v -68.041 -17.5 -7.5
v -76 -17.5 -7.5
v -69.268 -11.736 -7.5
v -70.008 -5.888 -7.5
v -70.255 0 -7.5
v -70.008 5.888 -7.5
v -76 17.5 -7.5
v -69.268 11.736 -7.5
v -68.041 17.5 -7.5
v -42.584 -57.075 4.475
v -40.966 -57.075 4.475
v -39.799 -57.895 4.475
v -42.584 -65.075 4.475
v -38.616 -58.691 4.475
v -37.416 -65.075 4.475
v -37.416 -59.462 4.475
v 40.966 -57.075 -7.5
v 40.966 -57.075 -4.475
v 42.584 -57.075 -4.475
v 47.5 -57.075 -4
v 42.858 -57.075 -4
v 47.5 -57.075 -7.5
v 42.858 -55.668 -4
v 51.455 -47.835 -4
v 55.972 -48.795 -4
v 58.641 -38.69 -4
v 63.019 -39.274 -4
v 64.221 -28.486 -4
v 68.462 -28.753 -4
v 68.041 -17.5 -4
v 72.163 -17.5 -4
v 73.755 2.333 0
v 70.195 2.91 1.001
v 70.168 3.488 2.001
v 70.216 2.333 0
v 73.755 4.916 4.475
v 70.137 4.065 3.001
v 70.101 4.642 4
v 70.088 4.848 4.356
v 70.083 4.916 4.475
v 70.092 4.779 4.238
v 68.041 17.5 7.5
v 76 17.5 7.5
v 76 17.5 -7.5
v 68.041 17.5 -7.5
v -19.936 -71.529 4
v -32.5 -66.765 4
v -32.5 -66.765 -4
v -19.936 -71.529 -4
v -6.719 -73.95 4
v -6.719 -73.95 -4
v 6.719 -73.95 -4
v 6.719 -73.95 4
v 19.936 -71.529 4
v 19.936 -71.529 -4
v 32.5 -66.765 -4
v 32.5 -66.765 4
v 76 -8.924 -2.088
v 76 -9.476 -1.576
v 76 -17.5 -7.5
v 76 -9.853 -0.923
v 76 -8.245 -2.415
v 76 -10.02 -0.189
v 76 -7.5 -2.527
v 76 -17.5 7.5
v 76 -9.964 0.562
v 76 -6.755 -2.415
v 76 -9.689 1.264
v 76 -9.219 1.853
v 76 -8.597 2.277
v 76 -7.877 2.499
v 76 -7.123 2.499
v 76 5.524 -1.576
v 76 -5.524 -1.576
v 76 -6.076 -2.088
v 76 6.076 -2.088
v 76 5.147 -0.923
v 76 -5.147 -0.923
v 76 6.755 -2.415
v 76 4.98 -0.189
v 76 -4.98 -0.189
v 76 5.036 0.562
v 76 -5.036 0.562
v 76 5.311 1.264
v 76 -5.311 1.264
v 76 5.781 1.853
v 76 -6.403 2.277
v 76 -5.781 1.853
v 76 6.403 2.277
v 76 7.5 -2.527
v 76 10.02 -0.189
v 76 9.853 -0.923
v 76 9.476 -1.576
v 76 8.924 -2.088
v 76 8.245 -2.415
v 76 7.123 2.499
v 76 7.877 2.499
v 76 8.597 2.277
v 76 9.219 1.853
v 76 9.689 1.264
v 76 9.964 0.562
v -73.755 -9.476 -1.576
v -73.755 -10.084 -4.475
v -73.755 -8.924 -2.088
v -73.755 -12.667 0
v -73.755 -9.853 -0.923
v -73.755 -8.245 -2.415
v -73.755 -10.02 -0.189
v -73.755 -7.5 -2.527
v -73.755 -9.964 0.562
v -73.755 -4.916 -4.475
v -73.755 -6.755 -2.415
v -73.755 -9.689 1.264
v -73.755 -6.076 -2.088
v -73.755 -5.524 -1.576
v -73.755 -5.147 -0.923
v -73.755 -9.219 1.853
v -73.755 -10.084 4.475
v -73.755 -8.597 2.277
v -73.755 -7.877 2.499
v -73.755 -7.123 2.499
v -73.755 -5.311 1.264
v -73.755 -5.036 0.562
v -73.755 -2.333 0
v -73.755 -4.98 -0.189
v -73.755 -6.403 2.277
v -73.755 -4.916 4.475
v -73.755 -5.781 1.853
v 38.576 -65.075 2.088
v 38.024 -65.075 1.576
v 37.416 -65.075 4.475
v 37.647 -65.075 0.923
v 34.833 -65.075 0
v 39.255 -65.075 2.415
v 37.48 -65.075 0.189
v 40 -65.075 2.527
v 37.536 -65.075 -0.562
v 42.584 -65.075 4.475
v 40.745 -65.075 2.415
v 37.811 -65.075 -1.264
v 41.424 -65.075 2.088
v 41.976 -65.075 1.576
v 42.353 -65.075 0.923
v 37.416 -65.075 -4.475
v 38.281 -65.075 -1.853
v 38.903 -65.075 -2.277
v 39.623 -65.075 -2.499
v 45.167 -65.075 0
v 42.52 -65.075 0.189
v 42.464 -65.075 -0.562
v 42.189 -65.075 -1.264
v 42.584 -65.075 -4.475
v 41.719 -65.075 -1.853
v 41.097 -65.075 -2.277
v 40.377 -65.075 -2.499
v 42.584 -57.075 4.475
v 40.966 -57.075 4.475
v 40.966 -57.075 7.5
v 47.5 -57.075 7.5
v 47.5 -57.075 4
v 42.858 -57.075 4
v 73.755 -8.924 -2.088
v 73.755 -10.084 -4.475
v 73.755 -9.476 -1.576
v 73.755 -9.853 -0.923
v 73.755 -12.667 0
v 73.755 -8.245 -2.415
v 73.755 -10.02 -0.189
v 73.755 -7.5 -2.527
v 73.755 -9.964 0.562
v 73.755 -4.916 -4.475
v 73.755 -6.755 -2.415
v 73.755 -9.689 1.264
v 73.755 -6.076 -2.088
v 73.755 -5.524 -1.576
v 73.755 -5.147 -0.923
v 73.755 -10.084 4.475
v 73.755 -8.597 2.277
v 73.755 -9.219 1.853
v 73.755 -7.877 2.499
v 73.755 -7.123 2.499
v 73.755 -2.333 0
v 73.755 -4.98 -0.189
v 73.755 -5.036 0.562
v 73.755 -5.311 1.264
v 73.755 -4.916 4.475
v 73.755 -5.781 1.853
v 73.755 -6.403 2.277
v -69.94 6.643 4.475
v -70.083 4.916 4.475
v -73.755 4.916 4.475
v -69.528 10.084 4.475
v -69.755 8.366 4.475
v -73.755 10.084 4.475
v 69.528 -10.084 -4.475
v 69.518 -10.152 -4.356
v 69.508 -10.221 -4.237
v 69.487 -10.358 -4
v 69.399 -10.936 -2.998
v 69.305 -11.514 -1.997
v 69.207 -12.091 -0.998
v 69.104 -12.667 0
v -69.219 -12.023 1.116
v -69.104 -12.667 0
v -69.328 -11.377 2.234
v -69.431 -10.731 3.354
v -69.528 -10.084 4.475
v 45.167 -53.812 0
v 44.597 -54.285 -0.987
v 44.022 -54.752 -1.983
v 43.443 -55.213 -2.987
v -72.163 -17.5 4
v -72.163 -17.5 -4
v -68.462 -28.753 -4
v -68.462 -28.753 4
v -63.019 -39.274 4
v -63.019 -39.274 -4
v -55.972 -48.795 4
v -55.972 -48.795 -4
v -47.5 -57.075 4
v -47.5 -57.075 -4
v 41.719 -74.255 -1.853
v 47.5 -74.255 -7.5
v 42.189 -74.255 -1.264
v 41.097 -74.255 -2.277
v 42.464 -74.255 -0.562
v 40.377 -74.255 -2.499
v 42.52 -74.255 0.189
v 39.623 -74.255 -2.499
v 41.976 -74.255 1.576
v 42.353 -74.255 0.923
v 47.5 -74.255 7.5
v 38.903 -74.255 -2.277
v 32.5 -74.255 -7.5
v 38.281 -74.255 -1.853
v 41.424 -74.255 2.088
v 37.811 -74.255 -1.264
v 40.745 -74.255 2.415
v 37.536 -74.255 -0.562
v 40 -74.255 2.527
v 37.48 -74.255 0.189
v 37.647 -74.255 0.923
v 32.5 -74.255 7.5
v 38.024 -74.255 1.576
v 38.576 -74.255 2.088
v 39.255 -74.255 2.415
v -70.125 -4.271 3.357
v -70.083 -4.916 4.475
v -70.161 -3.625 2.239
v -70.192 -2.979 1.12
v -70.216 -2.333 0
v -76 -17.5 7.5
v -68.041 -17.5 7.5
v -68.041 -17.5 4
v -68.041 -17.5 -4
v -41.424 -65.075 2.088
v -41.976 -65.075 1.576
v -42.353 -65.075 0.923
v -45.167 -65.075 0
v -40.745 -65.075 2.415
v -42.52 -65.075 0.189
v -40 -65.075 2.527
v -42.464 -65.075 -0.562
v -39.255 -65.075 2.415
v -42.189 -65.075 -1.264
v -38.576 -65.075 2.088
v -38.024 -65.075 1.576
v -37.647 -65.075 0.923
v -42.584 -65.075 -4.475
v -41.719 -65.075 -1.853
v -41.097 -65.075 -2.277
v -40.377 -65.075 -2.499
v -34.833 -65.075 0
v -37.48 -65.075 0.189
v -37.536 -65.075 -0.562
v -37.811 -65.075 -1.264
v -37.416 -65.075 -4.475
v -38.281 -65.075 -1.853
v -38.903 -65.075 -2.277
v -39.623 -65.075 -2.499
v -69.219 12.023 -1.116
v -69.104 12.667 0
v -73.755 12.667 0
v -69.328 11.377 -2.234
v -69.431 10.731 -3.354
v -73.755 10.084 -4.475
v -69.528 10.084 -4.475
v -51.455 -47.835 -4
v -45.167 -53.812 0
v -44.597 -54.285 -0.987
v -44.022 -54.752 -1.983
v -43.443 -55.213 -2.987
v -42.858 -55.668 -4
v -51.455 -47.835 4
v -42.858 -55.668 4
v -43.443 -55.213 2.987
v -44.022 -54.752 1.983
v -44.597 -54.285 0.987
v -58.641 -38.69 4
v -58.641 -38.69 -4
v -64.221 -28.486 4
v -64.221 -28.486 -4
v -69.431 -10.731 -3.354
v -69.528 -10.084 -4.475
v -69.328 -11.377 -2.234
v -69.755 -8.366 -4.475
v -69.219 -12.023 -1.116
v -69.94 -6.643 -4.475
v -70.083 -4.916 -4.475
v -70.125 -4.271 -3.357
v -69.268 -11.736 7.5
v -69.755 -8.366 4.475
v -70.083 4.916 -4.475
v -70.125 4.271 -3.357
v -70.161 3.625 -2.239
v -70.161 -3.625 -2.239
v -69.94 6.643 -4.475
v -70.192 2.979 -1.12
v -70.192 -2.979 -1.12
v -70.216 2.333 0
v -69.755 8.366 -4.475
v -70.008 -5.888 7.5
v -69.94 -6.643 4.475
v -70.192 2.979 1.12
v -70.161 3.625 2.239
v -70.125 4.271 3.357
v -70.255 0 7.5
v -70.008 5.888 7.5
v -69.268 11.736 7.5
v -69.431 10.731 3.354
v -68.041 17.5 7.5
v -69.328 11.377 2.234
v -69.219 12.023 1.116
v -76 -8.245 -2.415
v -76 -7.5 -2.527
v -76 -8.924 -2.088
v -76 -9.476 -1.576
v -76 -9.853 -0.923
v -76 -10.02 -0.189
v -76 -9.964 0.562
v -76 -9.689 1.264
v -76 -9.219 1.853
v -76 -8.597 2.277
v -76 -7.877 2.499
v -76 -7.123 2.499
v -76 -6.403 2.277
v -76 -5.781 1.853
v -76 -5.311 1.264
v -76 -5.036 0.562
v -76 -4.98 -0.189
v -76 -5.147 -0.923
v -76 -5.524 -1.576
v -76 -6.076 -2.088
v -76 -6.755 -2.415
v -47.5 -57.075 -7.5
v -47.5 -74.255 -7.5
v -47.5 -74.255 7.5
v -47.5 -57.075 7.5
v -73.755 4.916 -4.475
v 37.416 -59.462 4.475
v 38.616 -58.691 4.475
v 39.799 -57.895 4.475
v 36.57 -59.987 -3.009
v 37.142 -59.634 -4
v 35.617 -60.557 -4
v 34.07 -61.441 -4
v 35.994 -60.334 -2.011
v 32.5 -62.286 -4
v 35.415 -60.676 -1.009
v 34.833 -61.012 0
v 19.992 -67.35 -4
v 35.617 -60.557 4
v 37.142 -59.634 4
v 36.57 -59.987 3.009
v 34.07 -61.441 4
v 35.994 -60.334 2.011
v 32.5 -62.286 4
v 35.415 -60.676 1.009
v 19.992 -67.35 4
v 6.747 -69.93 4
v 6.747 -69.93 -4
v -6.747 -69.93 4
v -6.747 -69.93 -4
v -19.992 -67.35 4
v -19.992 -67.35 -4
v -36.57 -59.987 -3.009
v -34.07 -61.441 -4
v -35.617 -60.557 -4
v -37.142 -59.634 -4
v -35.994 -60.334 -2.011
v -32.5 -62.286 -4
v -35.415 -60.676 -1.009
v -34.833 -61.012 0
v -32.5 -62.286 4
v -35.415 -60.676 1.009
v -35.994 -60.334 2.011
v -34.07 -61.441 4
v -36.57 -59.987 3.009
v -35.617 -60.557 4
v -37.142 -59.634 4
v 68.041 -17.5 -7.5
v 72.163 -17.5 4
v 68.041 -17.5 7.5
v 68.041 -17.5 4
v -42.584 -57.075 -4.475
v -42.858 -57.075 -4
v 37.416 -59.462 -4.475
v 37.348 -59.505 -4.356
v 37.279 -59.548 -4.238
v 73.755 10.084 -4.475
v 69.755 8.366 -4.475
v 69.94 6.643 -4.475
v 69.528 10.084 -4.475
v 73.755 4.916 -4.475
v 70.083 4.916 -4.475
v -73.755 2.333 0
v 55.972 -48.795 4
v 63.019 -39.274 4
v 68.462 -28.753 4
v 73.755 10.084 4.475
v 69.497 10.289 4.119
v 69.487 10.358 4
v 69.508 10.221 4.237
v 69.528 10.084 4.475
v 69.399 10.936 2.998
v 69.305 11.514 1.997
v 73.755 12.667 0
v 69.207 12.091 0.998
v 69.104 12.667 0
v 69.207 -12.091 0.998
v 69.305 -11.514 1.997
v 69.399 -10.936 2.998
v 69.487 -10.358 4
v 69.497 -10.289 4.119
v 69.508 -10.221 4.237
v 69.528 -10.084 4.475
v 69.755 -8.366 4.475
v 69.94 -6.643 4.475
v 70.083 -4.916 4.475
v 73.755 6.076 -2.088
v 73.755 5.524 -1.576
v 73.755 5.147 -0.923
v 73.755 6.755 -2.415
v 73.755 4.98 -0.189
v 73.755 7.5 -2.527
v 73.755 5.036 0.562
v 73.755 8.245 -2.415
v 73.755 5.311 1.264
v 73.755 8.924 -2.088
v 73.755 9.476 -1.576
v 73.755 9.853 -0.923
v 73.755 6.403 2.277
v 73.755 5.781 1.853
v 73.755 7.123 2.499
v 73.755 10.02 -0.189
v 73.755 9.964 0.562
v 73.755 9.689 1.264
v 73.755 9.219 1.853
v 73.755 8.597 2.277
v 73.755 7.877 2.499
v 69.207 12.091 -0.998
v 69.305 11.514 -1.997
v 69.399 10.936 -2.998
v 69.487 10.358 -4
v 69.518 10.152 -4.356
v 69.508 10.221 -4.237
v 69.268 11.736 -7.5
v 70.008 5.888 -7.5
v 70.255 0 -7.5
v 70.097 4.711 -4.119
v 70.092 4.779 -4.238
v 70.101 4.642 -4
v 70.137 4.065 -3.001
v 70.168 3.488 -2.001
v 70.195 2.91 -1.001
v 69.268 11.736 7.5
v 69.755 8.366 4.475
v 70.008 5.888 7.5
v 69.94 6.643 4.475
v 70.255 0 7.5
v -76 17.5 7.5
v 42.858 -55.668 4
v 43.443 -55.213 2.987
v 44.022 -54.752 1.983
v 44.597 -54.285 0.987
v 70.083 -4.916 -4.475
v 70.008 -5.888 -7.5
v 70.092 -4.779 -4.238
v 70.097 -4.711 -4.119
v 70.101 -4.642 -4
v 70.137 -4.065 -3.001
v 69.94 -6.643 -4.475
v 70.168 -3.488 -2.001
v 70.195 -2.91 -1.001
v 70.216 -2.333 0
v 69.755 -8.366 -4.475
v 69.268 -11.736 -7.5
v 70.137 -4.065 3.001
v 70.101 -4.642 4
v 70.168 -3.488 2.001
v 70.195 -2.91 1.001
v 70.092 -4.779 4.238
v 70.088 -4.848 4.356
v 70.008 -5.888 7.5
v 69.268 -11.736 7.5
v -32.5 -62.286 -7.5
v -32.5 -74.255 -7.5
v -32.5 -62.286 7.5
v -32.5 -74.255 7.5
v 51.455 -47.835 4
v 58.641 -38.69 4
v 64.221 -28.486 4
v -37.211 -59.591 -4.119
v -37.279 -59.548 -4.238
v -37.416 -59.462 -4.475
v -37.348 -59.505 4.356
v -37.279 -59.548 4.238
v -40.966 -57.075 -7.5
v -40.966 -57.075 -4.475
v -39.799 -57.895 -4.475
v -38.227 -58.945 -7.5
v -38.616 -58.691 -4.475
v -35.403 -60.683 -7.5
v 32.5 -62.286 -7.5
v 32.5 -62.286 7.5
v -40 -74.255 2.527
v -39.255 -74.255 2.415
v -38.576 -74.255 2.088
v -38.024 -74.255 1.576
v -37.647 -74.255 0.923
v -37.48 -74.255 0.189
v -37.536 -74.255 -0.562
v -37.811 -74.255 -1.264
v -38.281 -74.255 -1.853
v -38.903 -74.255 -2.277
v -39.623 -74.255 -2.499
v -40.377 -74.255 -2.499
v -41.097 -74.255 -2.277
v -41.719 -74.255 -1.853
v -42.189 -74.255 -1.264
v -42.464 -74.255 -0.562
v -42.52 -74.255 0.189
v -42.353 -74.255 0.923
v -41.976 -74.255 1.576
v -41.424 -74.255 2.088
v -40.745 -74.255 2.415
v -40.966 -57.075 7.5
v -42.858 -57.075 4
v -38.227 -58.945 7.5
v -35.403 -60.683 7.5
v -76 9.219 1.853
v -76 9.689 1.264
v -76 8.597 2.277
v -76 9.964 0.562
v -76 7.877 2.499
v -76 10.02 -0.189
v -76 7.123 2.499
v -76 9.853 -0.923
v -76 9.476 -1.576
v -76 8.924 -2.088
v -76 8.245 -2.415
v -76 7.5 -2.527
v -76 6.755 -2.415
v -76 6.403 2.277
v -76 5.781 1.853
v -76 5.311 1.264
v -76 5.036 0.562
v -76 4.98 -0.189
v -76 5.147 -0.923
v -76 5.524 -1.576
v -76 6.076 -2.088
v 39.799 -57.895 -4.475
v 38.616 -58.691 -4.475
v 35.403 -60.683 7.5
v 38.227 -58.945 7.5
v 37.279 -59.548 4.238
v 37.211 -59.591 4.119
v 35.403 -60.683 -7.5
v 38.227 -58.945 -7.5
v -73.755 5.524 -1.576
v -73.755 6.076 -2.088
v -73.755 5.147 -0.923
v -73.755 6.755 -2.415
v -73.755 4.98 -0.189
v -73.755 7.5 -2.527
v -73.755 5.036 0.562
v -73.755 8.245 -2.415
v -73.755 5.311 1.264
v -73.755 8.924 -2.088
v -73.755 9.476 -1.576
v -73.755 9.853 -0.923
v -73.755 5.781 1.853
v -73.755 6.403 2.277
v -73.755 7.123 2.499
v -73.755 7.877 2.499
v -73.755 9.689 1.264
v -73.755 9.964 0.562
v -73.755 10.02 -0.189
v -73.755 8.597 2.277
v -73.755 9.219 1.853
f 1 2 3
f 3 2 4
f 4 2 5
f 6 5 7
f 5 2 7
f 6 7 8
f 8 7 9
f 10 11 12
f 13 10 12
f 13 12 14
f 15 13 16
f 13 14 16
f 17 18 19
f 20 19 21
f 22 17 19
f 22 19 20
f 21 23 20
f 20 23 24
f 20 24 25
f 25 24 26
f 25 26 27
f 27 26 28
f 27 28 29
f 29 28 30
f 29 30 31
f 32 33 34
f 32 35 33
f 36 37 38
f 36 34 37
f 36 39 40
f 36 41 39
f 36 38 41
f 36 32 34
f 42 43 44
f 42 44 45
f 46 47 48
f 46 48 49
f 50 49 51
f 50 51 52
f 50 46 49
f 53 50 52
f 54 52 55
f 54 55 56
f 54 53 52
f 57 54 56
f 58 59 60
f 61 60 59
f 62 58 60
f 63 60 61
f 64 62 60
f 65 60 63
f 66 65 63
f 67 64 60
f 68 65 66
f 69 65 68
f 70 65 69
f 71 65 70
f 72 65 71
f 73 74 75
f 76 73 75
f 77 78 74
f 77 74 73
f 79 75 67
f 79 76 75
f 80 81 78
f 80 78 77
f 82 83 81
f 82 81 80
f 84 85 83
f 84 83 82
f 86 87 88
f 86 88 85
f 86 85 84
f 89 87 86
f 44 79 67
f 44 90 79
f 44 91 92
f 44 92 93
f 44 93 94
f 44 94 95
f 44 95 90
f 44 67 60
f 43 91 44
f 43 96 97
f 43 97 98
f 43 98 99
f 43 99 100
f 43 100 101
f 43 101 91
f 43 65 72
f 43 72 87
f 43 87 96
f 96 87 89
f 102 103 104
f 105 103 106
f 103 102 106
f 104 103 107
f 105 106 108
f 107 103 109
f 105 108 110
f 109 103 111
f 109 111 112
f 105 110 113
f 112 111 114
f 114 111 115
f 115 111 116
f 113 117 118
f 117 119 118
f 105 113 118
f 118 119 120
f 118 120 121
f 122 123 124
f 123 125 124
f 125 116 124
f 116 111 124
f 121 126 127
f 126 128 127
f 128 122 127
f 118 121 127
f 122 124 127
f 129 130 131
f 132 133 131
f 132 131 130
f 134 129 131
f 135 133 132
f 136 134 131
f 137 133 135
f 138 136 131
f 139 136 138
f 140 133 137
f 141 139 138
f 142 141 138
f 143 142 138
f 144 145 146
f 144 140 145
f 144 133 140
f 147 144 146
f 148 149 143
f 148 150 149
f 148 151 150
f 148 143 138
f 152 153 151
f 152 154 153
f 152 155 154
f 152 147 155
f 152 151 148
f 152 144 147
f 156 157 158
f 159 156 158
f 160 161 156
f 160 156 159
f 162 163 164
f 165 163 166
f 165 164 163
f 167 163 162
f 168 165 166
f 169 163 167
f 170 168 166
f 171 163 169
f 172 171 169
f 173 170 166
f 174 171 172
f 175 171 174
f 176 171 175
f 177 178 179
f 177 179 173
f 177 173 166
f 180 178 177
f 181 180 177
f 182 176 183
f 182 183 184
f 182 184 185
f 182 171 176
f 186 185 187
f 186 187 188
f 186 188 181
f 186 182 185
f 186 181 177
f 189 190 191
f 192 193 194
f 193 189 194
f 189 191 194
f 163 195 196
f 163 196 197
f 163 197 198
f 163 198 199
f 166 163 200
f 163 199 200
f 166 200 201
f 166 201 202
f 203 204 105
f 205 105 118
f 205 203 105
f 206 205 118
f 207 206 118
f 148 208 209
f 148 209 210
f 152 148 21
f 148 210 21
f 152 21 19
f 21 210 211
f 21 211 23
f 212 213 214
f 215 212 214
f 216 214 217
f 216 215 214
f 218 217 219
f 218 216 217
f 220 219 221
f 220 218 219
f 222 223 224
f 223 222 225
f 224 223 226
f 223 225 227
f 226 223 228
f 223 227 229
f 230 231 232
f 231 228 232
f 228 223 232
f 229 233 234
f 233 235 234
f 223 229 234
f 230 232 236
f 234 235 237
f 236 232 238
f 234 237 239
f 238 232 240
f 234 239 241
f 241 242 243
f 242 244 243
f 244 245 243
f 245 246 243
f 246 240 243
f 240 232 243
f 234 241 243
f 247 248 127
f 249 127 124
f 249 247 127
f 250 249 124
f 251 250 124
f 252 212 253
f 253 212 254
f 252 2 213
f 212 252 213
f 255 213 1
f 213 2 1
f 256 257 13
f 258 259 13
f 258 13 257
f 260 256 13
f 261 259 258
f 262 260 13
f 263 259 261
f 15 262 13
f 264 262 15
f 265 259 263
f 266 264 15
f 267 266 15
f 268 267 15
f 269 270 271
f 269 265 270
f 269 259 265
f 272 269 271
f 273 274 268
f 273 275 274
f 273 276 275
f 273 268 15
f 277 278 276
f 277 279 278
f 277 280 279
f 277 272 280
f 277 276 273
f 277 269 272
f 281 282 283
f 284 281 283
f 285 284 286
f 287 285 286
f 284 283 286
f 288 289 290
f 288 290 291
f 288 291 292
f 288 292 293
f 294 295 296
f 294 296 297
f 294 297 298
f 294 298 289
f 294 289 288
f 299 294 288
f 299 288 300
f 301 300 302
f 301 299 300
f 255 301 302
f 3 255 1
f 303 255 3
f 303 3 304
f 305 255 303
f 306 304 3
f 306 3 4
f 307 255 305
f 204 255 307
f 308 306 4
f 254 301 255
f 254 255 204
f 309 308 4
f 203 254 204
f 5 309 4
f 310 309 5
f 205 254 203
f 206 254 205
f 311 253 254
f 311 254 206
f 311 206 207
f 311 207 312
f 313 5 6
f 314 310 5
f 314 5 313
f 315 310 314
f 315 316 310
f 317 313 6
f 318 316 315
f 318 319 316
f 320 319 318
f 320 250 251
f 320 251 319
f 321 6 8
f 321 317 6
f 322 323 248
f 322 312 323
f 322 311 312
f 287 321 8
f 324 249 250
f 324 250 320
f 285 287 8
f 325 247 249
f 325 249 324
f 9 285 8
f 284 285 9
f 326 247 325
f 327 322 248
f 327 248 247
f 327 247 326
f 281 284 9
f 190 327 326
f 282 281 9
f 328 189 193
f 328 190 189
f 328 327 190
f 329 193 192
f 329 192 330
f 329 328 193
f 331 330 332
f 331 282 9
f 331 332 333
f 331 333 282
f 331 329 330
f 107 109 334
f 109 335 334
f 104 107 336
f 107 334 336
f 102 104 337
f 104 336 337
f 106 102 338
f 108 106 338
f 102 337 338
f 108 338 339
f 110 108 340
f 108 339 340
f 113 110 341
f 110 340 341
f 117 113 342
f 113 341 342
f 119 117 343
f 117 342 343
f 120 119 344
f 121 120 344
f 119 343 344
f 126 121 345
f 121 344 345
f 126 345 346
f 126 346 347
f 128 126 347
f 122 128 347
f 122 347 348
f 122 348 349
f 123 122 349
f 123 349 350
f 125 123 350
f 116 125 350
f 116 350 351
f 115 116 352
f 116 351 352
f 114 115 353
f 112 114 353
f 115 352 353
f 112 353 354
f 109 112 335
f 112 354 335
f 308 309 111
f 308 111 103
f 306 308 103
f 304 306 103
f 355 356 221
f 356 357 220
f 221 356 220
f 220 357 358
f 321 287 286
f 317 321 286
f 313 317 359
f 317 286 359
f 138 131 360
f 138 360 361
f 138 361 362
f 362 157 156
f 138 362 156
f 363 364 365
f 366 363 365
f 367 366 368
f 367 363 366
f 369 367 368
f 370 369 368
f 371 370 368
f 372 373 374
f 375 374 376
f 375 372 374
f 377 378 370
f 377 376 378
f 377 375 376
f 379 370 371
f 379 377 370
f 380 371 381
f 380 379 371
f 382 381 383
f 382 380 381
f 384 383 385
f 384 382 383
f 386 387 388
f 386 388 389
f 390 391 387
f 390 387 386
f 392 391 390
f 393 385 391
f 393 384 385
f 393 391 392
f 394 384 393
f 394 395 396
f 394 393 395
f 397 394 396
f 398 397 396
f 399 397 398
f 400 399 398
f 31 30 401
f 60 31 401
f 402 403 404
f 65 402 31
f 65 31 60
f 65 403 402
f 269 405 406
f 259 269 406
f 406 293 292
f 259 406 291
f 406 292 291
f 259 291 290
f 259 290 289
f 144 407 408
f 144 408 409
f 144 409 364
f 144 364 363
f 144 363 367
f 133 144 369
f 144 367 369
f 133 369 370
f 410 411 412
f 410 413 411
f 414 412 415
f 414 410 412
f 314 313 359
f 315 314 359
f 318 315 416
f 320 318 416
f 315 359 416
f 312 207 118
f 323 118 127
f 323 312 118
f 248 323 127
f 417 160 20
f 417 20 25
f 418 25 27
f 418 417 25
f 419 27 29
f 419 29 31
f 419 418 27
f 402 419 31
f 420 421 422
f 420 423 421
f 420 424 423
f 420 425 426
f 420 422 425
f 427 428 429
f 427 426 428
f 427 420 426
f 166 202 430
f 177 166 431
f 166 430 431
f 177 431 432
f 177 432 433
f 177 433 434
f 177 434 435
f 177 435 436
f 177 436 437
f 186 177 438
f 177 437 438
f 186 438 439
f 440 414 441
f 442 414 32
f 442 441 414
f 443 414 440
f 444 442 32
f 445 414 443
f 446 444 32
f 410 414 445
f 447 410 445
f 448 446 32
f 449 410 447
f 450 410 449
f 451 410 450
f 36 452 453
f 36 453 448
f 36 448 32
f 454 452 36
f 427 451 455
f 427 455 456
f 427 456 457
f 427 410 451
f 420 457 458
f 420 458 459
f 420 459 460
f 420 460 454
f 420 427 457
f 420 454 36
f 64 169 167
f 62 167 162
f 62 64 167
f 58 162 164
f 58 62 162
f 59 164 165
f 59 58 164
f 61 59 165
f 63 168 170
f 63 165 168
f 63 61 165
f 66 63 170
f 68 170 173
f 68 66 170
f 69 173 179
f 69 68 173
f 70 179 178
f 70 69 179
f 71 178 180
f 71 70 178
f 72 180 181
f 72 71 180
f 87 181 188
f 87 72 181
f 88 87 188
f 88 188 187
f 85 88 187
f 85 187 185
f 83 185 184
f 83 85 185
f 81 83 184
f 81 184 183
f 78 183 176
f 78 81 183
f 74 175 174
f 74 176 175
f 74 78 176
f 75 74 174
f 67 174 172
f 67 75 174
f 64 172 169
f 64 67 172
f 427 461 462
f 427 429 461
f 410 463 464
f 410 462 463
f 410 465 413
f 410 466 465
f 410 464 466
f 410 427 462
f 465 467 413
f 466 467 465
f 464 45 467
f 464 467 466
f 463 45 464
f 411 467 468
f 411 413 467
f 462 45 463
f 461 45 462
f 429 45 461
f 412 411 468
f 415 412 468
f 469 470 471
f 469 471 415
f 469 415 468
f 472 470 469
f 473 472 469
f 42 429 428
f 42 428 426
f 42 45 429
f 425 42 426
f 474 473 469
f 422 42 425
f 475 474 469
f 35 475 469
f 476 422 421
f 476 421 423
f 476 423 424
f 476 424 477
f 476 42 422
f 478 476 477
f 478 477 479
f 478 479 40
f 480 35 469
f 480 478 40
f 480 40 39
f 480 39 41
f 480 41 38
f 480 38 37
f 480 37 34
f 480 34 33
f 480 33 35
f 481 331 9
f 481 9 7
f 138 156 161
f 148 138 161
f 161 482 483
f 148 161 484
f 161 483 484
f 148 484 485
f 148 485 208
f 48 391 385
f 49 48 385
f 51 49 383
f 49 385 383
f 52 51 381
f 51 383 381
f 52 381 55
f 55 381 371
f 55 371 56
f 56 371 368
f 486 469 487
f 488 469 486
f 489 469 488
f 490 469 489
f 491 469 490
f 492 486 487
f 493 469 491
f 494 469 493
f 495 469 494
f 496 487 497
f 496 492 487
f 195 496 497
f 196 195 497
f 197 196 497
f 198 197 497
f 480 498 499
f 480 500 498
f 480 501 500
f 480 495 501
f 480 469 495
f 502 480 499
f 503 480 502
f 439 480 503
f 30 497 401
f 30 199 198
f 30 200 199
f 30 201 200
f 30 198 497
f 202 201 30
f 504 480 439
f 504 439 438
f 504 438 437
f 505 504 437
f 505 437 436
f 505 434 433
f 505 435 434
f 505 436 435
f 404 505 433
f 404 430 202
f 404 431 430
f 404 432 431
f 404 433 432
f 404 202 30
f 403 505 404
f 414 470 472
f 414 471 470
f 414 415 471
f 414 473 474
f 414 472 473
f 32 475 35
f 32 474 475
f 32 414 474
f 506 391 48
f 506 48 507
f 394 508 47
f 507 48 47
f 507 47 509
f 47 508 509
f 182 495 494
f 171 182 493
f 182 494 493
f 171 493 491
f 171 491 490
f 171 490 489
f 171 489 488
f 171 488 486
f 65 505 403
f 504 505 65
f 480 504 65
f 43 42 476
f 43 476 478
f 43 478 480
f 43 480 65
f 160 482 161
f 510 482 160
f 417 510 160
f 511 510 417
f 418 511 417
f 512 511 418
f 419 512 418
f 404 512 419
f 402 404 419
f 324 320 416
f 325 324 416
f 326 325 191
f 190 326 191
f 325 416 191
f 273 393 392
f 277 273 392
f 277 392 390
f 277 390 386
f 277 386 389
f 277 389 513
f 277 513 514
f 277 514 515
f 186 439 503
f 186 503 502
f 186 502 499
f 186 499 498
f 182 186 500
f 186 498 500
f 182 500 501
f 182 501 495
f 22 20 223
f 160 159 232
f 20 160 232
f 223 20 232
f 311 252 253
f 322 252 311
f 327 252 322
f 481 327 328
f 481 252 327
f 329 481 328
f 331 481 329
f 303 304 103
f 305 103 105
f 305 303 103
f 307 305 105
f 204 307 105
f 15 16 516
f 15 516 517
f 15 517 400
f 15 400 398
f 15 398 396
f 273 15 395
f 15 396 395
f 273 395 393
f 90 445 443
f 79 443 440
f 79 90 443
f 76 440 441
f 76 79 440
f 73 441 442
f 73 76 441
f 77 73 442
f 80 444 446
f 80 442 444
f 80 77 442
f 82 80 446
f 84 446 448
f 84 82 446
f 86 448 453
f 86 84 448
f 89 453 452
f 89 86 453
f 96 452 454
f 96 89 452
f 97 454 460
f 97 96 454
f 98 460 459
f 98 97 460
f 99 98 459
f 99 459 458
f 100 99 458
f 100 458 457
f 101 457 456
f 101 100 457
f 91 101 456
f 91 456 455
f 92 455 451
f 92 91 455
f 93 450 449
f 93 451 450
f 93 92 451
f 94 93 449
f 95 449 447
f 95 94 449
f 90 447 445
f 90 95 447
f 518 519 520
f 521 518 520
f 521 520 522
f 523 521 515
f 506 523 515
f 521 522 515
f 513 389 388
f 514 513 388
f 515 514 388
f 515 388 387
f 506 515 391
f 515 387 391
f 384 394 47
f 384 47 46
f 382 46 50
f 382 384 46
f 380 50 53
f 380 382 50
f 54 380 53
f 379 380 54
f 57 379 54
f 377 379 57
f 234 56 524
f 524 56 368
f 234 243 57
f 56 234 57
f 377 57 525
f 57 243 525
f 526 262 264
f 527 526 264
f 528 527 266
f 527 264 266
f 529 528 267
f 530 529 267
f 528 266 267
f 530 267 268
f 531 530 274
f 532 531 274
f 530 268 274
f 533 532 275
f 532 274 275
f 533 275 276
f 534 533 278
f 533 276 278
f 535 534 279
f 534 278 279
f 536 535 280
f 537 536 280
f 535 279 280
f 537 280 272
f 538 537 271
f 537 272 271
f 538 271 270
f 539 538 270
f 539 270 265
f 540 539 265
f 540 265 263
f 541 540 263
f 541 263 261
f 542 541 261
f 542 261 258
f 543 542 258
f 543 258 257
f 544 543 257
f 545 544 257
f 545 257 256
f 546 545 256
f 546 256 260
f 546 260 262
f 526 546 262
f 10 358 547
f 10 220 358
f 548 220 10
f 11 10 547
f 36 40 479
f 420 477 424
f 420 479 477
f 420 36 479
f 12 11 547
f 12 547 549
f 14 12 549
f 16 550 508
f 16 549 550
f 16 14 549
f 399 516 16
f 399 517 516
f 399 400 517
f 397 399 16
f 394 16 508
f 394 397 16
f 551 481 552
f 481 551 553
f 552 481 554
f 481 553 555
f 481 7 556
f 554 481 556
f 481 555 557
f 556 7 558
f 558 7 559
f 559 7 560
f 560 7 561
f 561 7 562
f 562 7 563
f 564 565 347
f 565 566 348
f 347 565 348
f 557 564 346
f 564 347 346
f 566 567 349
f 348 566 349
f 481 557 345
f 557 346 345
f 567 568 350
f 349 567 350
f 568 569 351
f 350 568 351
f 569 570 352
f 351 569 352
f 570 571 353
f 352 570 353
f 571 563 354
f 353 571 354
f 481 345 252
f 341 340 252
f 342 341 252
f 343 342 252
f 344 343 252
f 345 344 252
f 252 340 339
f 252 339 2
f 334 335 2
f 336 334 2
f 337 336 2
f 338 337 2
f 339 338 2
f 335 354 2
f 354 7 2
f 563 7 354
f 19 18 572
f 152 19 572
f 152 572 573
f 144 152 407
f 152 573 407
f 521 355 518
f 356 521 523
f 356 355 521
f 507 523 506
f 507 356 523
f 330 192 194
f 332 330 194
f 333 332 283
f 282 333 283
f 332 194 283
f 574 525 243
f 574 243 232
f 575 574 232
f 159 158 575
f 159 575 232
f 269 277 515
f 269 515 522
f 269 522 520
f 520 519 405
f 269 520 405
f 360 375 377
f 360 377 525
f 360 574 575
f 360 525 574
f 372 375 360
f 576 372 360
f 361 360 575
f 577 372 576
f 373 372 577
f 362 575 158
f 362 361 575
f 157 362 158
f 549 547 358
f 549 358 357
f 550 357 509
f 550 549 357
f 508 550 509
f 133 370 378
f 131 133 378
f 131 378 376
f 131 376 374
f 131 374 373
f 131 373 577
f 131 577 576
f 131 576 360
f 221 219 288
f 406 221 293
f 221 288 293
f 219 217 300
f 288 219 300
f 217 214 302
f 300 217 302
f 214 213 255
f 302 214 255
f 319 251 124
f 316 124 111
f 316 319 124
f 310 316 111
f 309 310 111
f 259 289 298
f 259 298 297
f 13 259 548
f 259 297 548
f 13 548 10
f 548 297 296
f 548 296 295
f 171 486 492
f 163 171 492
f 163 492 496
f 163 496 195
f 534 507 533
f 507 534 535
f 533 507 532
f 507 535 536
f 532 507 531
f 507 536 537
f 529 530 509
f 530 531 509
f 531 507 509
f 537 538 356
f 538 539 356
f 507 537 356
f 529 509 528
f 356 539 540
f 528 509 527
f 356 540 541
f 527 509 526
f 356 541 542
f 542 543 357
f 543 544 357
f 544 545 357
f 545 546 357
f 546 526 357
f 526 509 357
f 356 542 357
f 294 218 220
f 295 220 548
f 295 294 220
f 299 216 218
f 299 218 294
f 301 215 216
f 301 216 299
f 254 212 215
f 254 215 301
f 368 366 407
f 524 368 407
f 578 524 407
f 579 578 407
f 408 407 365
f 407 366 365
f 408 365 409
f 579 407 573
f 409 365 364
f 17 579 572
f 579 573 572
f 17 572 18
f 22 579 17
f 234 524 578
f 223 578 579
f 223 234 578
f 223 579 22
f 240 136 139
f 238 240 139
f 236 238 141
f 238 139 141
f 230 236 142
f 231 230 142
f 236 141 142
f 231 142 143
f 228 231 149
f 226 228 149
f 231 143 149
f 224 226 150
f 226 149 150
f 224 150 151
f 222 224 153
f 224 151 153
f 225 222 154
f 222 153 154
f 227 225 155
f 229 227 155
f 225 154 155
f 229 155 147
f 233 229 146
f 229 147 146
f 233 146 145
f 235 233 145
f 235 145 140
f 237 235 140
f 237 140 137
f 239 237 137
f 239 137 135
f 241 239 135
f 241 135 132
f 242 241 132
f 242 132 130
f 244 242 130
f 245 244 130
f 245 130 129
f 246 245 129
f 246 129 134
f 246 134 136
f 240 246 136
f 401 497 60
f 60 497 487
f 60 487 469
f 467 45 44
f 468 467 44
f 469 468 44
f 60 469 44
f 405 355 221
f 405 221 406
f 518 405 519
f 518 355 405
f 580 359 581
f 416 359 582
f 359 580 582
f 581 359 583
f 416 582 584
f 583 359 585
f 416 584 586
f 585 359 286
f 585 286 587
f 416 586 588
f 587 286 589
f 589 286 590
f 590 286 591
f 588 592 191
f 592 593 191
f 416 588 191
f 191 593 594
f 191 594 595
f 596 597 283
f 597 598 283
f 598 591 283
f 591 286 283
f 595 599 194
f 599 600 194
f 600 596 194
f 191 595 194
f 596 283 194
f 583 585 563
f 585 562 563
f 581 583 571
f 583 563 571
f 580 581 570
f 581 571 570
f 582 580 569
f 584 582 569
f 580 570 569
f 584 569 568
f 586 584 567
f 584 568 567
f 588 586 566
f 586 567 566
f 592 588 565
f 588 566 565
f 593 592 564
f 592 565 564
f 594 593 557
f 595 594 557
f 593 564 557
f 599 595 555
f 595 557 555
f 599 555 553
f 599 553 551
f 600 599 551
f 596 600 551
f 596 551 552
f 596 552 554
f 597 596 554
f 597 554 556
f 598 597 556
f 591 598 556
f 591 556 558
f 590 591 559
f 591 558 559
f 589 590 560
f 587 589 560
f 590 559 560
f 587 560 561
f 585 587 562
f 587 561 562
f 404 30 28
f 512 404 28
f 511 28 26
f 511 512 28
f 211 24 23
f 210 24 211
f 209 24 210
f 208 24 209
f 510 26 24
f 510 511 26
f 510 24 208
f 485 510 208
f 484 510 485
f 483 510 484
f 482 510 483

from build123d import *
from build123d.topology import SkipClean

# Parameters (mm, degrees)
BOSS_EXTRUDE1_DEPTH                 = 4
BOSS_EXTRUDE2_DEPTH                 = 7.5
CUT_EXTRUDE1_DEPTH                  = 3.5
F_8_0_199_DIAMETER_HOLE1_AT_2_COUNT = 2
F_8_0_199_DIAMETER_HOLE1_AT_2_PITCH = 15
BOSS_EXTRUDE3_REACH                 = 108.518
BOSS_EXTRUDE3_DIRECTION_2_REACH     = 108.518
CUT_EXTRUDE2_DEPTH                  = 3.5
CUT_EXTRUDE2_DEPTH_BACK             = 8
F_8_0_199_DIAMETER_HOLE2_D          = 5.0546
F_8_0_199_DIAMETER_HOLE2_DEPTH      = 11.481444958
F_8_0_199_DIAMETER_HOLE2_TIP        = 1.518555042


with BuildPart() as part:
    # Sketch1 → Boss-Extrude1 (new, symmetric)
    with BuildSketch(Plane.XY):
        with BuildLine():
            Line((-76, 17.5), (-76, -17.5))
            Line((-76, -17.5), (-72.163391169, -17.5))
            ThreePointArc((-72.163391169, -17.5), (0, -74.255), (72.163391169, -17.5))
            Line((72.163391169, -17.5), (76, -17.5))
            Line((76, -17.5), (76, 17.5))
            Line((76, 17.5), (68.04053957, 17.5))
            ThreePointArc((68.04053957, 17.5), (0, -70.255), (-68.04053957, 17.5))
            Line((-68.04053957, 17.5), (-76, 17.5))
        make_face()
    extrude(amount=BOSS_EXTRUDE1_DEPTH, both=True)

    # Sketch1<5> → Boss-Extrude2 (add, symmetric)
    with BuildSketch(Plane.XY):
        with BuildLine():
            Line((-76, 17.5), (-76, -17.5))
            Line((-76, -17.5), (-68.04053957, -17.5))
            ThreePointArc((-68.04053957, -17.5), (-70.255, 0), (-68.04053957, 17.5))
            Line((-68.04053957, 17.5), (-76, 17.5))
        make_face()
        with BuildLine():
            Line((68.04053957, -17.5), (76, -17.5))
            Line((76, -17.5), (76, 17.5))
            Line((76, 17.5), (68.04053957, 17.5))
            ThreePointArc((68.04053957, 17.5), (70.255, 0), (68.04053957, -17.5))
        make_face()
    extrude(amount=BOSS_EXTRUDE2_DEPTH, both=True)

    # Sketch2 → Cut-Extrude1 (cut, symmetric)
    with BuildSketch(Plane.ZY.offset(-70.255)):
        Polygon((0, 2.332715091), (4.475, 4.916357545), (4.475, 10.083642455), (0, 12.667284909), (-4.475, 10.083642455), (-4.475, 4.916357545), align=None)
        Polygon((0, -12.667284909), (4.475, -10.083642455), (4.475, -4.916357545), (0, -2.332715091), (-4.475, -4.916357545), (-4.475, -10.083642455), align=None)
    cut_extrude1 = extrude(amount=CUT_EXTRUDE1_DEPTH, both=True, mode=Mode.SUBTRACT)

    # Sketch4 → #8 (0.199) Diameter Hole1 (revolve, cut)
    with BuildSketch(Plane(origin=(76, 7.5, 0), x_dir=(0, 0, -1), z_dir=(0, 1, 0))):
        Polygon((0, 0), (0, 10.71), (2.5273, 9.191444958), (2.5273, 0), align=None)
    f_8_0_199_diameter_hole1 = revolve(axis=Axis((82.35, 7.5, 0), (-1, 0, 0)), mode=Mode.SUBTRACT)

    # #8 (0.199) Diameter Hole1 at 2: #8 (0.199) Diameter Hole1 ×2
    with Locations(*[(0, -i * F_8_0_199_DIAMETER_HOLE1_AT_2_PITCH, 0) for i in range(1, F_8_0_199_DIAMETER_HOLE1_AT_2_COUNT)]):
        add(f_8_0_199_diameter_hole1, mode=Mode.SUBTRACT)

    # Mirror1: Cut-Extrude1, #8 (0.199) Diameter Hole1 across plane
    add(cut_extrude1.mirror(Plane(origin=(0, 0, 0), x_dir=(0, 0, 1), z_dir=(1, 0, 0))), mode=Mode.SUBTRACT)
    add(f_8_0_199_diameter_hole1.mirror(Plane(origin=(0, 0, 0), x_dir=(0, 0, 1), z_dir=(1, 0, 0))), mode=Mode.SUBTRACT)

    # Mirror1 copy 1 sketch → Mirror1 copy 1 (revolve, cut)
    with BuildSketch(Plane(origin=(-76, -7.5, 0), x_dir=(0, 0, -1), z_dir=(0, 1, 0))):
        Polygon((0, 0), (0, -10.71), (2.5273, -9.191444958), (2.5273, 0), align=None)
    revolve(axis=Axis((-82.35, -7.5, 0), (-1, 0, 0)), mode=Mode.SUBTRACT)

    # Boss-Extrude3: up to this face of the body (flat: up to its plane)
    boss_extrude3_end = Plane(part.part.faces().sort_by_distance((-72.727295349, 0, 7.5))[0])
    # Sketch5 → Boss-Extrude3 (add, up to the picked face)
    with BuildSketch(Plane.XY, mode=Mode.PRIVATE) as boss_extrude3_sk1:
        with BuildLine():
            Line((47.5, -57.074994744), (47.5, -74.255))
            Line((47.5, -74.255), (32.5, -74.255))
            Line((32.5, -74.255), (32.5, -62.285752986))
            ThreePointArc((32.5, -62.285752986), (36.825261363, -59.830302946), (40.96596148, -57.074994744))
            Line((40.96596148, -57.074994744), (47.5, -57.074994744))
        make_face()
    boss_extrude3_tool1 = split(extrude(boss_extrude3_sk1.sketch, amount=BOSS_EXTRUDE3_REACH, mode=Mode.PRIVATE), bisect_by=boss_extrude3_end, keep=Keep.BOTH, mode=Mode.PRIVATE)
    # Sketch5 → Boss-Extrude3 (add, up to the picked face)
    with BuildSketch(Plane.XY, mode=Mode.PRIVATE) as boss_extrude3_sk2:
        with BuildLine():
            Line((-32.5, -74.255), (-47.5, -74.255))
            Line((-47.5, -74.255), (-47.5, -57.074994744))
            Line((-47.5, -57.074994744), (-40.96596148, -57.074994744))
            ThreePointArc((-40.96596148, -57.074994744), (-36.825261363, -59.830302946), (-32.5, -62.285752986))
            Line((-32.5, -62.285752986), (-32.5, -74.255))
        make_face()
    boss_extrude3_tool2 = split(extrude(boss_extrude3_sk2.sketch, amount=BOSS_EXTRUDE3_REACH, mode=Mode.PRIVATE), bisect_by=boss_extrude3_end, keep=Keep.BOTH, mode=Mode.PRIVATE)
    add(boss_extrude3_tool1.solids().sort_by(Axis((40.456136, -66.339152, 0), (0, 0, 1)))[0])
    add(boss_extrude3_tool2.solids().sort_by(Axis((-40.456136, -66.339152, 0), (0, 0, 1)))[0])

    # Boss-Extrude3 direction 2: up to this face of the body (flat: up to its plane)
    boss_extrude3_direction_2_end = Plane(part.part.faces().sort_by_distance((-72.727295349, 0, -7.5))[0])
    # Sketch5 → Boss-Extrude3 direction 2 (add, up to the picked face)
    with BuildSketch(Plane.XY, mode=Mode.PRIVATE) as boss_extrude3_direction_2_sk1:
        with BuildLine():
            Line((47.5, -57.074994744), (47.5, -74.255))
            Line((47.5, -74.255), (32.5, -74.255))
            Line((32.5, -74.255), (32.5, -62.285752986))
            ThreePointArc((32.5, -62.285752986), (36.825261363, -59.830302946), (40.96596148, -57.074994744))
            Line((40.96596148, -57.074994744), (47.5, -57.074994744))
        make_face()
    boss_extrude3_direction_2_tool1 = split(extrude(boss_extrude3_direction_2_sk1.sketch, amount=-BOSS_EXTRUDE3_DIRECTION_2_REACH, mode=Mode.PRIVATE), bisect_by=boss_extrude3_direction_2_end, keep=Keep.BOTH, mode=Mode.PRIVATE)
    # Sketch5 → Boss-Extrude3 direction 2 (add, up to the picked face)
    with BuildSketch(Plane.XY, mode=Mode.PRIVATE) as boss_extrude3_direction_2_sk2:
        with BuildLine():
            Line((-32.5, -74.255), (-47.5, -74.255))
            Line((-47.5, -74.255), (-47.5, -57.074994744))
            Line((-47.5, -57.074994744), (-40.96596148, -57.074994744))
            ThreePointArc((-40.96596148, -57.074994744), (-36.825261363, -59.830302946), (-32.5, -62.285752986))
            Line((-32.5, -62.285752986), (-32.5, -74.255))
        make_face()
    boss_extrude3_direction_2_tool2 = split(extrude(boss_extrude3_direction_2_sk2.sketch, amount=-BOSS_EXTRUDE3_DIRECTION_2_REACH, mode=Mode.PRIVATE), bisect_by=boss_extrude3_direction_2_end, keep=Keep.BOTH, mode=Mode.PRIVATE)
    add(boss_extrude3_direction_2_tool1.solids().sort_by(Axis((40.456136, -66.339152, 0), (0, 0, -1)))[0])
    add(boss_extrude3_direction_2_tool2.solids().sort_by(Axis((-40.456136, -66.339152, 0), (0, 0, -1)))[0])

    # Sketch6 → Cut-Extrude2 (cut, two sides: drawn at the far end of the back side and taken through both)
    with SkipClean():  # the faces are left unmerged after this step: merging them gives an invalid solid
        with BuildSketch(Plane(origin=(0, -57.074994744, 0), x_dir=(1, 0, 0), z_dir=(0, 1, 0)).offset(-CUT_EXTRUDE2_DEPTH_BACK)):
            Polygon((-37.416357545, -4.475), (-34.832715091, 0), (-37.416357545, 4.475), (-42.583642455, 4.475), (-45.167284909, 0), (-42.583642455, -4.475), align=None)
            Polygon((42.583642455, -4.475), (45.167284909, 0), (42.583642455, 4.475), (37.416357545, 4.475), (34.832715091, 0), (37.416357545, -4.475), align=None)
        extrude(amount=CUT_EXTRUDE2_DEPTH + CUT_EXTRUDE2_DEPTH_BACK, mode=Mode.SUBTRACT)

    # #8 (0.199) Diameter Hole2
    with Locations(Plane(origin=(-40, -74.255, 0), x_dir=(0, 0, -1), z_dir=(0, -1, 0))):
        with Locations((0, 0), (0, 80)):
            Hole(F_8_0_199_DIAMETER_HOLE2_D / 2, depth=F_8_0_199_DIAMETER_HOLE2_DEPTH)
            with Locations((0, 0, -(F_8_0_199_DIAMETER_HOLE2_DEPTH + F_8_0_199_DIAMETER_HOLE2_TIP / 2))):  # 118° drill point
                Cone(0, F_8_0_199_DIAMETER_HOLE2_D / 2, F_8_0_199_DIAMETER_HOLE2_TIP, mode=Mode.SUBTRACT)


solid = part.part
